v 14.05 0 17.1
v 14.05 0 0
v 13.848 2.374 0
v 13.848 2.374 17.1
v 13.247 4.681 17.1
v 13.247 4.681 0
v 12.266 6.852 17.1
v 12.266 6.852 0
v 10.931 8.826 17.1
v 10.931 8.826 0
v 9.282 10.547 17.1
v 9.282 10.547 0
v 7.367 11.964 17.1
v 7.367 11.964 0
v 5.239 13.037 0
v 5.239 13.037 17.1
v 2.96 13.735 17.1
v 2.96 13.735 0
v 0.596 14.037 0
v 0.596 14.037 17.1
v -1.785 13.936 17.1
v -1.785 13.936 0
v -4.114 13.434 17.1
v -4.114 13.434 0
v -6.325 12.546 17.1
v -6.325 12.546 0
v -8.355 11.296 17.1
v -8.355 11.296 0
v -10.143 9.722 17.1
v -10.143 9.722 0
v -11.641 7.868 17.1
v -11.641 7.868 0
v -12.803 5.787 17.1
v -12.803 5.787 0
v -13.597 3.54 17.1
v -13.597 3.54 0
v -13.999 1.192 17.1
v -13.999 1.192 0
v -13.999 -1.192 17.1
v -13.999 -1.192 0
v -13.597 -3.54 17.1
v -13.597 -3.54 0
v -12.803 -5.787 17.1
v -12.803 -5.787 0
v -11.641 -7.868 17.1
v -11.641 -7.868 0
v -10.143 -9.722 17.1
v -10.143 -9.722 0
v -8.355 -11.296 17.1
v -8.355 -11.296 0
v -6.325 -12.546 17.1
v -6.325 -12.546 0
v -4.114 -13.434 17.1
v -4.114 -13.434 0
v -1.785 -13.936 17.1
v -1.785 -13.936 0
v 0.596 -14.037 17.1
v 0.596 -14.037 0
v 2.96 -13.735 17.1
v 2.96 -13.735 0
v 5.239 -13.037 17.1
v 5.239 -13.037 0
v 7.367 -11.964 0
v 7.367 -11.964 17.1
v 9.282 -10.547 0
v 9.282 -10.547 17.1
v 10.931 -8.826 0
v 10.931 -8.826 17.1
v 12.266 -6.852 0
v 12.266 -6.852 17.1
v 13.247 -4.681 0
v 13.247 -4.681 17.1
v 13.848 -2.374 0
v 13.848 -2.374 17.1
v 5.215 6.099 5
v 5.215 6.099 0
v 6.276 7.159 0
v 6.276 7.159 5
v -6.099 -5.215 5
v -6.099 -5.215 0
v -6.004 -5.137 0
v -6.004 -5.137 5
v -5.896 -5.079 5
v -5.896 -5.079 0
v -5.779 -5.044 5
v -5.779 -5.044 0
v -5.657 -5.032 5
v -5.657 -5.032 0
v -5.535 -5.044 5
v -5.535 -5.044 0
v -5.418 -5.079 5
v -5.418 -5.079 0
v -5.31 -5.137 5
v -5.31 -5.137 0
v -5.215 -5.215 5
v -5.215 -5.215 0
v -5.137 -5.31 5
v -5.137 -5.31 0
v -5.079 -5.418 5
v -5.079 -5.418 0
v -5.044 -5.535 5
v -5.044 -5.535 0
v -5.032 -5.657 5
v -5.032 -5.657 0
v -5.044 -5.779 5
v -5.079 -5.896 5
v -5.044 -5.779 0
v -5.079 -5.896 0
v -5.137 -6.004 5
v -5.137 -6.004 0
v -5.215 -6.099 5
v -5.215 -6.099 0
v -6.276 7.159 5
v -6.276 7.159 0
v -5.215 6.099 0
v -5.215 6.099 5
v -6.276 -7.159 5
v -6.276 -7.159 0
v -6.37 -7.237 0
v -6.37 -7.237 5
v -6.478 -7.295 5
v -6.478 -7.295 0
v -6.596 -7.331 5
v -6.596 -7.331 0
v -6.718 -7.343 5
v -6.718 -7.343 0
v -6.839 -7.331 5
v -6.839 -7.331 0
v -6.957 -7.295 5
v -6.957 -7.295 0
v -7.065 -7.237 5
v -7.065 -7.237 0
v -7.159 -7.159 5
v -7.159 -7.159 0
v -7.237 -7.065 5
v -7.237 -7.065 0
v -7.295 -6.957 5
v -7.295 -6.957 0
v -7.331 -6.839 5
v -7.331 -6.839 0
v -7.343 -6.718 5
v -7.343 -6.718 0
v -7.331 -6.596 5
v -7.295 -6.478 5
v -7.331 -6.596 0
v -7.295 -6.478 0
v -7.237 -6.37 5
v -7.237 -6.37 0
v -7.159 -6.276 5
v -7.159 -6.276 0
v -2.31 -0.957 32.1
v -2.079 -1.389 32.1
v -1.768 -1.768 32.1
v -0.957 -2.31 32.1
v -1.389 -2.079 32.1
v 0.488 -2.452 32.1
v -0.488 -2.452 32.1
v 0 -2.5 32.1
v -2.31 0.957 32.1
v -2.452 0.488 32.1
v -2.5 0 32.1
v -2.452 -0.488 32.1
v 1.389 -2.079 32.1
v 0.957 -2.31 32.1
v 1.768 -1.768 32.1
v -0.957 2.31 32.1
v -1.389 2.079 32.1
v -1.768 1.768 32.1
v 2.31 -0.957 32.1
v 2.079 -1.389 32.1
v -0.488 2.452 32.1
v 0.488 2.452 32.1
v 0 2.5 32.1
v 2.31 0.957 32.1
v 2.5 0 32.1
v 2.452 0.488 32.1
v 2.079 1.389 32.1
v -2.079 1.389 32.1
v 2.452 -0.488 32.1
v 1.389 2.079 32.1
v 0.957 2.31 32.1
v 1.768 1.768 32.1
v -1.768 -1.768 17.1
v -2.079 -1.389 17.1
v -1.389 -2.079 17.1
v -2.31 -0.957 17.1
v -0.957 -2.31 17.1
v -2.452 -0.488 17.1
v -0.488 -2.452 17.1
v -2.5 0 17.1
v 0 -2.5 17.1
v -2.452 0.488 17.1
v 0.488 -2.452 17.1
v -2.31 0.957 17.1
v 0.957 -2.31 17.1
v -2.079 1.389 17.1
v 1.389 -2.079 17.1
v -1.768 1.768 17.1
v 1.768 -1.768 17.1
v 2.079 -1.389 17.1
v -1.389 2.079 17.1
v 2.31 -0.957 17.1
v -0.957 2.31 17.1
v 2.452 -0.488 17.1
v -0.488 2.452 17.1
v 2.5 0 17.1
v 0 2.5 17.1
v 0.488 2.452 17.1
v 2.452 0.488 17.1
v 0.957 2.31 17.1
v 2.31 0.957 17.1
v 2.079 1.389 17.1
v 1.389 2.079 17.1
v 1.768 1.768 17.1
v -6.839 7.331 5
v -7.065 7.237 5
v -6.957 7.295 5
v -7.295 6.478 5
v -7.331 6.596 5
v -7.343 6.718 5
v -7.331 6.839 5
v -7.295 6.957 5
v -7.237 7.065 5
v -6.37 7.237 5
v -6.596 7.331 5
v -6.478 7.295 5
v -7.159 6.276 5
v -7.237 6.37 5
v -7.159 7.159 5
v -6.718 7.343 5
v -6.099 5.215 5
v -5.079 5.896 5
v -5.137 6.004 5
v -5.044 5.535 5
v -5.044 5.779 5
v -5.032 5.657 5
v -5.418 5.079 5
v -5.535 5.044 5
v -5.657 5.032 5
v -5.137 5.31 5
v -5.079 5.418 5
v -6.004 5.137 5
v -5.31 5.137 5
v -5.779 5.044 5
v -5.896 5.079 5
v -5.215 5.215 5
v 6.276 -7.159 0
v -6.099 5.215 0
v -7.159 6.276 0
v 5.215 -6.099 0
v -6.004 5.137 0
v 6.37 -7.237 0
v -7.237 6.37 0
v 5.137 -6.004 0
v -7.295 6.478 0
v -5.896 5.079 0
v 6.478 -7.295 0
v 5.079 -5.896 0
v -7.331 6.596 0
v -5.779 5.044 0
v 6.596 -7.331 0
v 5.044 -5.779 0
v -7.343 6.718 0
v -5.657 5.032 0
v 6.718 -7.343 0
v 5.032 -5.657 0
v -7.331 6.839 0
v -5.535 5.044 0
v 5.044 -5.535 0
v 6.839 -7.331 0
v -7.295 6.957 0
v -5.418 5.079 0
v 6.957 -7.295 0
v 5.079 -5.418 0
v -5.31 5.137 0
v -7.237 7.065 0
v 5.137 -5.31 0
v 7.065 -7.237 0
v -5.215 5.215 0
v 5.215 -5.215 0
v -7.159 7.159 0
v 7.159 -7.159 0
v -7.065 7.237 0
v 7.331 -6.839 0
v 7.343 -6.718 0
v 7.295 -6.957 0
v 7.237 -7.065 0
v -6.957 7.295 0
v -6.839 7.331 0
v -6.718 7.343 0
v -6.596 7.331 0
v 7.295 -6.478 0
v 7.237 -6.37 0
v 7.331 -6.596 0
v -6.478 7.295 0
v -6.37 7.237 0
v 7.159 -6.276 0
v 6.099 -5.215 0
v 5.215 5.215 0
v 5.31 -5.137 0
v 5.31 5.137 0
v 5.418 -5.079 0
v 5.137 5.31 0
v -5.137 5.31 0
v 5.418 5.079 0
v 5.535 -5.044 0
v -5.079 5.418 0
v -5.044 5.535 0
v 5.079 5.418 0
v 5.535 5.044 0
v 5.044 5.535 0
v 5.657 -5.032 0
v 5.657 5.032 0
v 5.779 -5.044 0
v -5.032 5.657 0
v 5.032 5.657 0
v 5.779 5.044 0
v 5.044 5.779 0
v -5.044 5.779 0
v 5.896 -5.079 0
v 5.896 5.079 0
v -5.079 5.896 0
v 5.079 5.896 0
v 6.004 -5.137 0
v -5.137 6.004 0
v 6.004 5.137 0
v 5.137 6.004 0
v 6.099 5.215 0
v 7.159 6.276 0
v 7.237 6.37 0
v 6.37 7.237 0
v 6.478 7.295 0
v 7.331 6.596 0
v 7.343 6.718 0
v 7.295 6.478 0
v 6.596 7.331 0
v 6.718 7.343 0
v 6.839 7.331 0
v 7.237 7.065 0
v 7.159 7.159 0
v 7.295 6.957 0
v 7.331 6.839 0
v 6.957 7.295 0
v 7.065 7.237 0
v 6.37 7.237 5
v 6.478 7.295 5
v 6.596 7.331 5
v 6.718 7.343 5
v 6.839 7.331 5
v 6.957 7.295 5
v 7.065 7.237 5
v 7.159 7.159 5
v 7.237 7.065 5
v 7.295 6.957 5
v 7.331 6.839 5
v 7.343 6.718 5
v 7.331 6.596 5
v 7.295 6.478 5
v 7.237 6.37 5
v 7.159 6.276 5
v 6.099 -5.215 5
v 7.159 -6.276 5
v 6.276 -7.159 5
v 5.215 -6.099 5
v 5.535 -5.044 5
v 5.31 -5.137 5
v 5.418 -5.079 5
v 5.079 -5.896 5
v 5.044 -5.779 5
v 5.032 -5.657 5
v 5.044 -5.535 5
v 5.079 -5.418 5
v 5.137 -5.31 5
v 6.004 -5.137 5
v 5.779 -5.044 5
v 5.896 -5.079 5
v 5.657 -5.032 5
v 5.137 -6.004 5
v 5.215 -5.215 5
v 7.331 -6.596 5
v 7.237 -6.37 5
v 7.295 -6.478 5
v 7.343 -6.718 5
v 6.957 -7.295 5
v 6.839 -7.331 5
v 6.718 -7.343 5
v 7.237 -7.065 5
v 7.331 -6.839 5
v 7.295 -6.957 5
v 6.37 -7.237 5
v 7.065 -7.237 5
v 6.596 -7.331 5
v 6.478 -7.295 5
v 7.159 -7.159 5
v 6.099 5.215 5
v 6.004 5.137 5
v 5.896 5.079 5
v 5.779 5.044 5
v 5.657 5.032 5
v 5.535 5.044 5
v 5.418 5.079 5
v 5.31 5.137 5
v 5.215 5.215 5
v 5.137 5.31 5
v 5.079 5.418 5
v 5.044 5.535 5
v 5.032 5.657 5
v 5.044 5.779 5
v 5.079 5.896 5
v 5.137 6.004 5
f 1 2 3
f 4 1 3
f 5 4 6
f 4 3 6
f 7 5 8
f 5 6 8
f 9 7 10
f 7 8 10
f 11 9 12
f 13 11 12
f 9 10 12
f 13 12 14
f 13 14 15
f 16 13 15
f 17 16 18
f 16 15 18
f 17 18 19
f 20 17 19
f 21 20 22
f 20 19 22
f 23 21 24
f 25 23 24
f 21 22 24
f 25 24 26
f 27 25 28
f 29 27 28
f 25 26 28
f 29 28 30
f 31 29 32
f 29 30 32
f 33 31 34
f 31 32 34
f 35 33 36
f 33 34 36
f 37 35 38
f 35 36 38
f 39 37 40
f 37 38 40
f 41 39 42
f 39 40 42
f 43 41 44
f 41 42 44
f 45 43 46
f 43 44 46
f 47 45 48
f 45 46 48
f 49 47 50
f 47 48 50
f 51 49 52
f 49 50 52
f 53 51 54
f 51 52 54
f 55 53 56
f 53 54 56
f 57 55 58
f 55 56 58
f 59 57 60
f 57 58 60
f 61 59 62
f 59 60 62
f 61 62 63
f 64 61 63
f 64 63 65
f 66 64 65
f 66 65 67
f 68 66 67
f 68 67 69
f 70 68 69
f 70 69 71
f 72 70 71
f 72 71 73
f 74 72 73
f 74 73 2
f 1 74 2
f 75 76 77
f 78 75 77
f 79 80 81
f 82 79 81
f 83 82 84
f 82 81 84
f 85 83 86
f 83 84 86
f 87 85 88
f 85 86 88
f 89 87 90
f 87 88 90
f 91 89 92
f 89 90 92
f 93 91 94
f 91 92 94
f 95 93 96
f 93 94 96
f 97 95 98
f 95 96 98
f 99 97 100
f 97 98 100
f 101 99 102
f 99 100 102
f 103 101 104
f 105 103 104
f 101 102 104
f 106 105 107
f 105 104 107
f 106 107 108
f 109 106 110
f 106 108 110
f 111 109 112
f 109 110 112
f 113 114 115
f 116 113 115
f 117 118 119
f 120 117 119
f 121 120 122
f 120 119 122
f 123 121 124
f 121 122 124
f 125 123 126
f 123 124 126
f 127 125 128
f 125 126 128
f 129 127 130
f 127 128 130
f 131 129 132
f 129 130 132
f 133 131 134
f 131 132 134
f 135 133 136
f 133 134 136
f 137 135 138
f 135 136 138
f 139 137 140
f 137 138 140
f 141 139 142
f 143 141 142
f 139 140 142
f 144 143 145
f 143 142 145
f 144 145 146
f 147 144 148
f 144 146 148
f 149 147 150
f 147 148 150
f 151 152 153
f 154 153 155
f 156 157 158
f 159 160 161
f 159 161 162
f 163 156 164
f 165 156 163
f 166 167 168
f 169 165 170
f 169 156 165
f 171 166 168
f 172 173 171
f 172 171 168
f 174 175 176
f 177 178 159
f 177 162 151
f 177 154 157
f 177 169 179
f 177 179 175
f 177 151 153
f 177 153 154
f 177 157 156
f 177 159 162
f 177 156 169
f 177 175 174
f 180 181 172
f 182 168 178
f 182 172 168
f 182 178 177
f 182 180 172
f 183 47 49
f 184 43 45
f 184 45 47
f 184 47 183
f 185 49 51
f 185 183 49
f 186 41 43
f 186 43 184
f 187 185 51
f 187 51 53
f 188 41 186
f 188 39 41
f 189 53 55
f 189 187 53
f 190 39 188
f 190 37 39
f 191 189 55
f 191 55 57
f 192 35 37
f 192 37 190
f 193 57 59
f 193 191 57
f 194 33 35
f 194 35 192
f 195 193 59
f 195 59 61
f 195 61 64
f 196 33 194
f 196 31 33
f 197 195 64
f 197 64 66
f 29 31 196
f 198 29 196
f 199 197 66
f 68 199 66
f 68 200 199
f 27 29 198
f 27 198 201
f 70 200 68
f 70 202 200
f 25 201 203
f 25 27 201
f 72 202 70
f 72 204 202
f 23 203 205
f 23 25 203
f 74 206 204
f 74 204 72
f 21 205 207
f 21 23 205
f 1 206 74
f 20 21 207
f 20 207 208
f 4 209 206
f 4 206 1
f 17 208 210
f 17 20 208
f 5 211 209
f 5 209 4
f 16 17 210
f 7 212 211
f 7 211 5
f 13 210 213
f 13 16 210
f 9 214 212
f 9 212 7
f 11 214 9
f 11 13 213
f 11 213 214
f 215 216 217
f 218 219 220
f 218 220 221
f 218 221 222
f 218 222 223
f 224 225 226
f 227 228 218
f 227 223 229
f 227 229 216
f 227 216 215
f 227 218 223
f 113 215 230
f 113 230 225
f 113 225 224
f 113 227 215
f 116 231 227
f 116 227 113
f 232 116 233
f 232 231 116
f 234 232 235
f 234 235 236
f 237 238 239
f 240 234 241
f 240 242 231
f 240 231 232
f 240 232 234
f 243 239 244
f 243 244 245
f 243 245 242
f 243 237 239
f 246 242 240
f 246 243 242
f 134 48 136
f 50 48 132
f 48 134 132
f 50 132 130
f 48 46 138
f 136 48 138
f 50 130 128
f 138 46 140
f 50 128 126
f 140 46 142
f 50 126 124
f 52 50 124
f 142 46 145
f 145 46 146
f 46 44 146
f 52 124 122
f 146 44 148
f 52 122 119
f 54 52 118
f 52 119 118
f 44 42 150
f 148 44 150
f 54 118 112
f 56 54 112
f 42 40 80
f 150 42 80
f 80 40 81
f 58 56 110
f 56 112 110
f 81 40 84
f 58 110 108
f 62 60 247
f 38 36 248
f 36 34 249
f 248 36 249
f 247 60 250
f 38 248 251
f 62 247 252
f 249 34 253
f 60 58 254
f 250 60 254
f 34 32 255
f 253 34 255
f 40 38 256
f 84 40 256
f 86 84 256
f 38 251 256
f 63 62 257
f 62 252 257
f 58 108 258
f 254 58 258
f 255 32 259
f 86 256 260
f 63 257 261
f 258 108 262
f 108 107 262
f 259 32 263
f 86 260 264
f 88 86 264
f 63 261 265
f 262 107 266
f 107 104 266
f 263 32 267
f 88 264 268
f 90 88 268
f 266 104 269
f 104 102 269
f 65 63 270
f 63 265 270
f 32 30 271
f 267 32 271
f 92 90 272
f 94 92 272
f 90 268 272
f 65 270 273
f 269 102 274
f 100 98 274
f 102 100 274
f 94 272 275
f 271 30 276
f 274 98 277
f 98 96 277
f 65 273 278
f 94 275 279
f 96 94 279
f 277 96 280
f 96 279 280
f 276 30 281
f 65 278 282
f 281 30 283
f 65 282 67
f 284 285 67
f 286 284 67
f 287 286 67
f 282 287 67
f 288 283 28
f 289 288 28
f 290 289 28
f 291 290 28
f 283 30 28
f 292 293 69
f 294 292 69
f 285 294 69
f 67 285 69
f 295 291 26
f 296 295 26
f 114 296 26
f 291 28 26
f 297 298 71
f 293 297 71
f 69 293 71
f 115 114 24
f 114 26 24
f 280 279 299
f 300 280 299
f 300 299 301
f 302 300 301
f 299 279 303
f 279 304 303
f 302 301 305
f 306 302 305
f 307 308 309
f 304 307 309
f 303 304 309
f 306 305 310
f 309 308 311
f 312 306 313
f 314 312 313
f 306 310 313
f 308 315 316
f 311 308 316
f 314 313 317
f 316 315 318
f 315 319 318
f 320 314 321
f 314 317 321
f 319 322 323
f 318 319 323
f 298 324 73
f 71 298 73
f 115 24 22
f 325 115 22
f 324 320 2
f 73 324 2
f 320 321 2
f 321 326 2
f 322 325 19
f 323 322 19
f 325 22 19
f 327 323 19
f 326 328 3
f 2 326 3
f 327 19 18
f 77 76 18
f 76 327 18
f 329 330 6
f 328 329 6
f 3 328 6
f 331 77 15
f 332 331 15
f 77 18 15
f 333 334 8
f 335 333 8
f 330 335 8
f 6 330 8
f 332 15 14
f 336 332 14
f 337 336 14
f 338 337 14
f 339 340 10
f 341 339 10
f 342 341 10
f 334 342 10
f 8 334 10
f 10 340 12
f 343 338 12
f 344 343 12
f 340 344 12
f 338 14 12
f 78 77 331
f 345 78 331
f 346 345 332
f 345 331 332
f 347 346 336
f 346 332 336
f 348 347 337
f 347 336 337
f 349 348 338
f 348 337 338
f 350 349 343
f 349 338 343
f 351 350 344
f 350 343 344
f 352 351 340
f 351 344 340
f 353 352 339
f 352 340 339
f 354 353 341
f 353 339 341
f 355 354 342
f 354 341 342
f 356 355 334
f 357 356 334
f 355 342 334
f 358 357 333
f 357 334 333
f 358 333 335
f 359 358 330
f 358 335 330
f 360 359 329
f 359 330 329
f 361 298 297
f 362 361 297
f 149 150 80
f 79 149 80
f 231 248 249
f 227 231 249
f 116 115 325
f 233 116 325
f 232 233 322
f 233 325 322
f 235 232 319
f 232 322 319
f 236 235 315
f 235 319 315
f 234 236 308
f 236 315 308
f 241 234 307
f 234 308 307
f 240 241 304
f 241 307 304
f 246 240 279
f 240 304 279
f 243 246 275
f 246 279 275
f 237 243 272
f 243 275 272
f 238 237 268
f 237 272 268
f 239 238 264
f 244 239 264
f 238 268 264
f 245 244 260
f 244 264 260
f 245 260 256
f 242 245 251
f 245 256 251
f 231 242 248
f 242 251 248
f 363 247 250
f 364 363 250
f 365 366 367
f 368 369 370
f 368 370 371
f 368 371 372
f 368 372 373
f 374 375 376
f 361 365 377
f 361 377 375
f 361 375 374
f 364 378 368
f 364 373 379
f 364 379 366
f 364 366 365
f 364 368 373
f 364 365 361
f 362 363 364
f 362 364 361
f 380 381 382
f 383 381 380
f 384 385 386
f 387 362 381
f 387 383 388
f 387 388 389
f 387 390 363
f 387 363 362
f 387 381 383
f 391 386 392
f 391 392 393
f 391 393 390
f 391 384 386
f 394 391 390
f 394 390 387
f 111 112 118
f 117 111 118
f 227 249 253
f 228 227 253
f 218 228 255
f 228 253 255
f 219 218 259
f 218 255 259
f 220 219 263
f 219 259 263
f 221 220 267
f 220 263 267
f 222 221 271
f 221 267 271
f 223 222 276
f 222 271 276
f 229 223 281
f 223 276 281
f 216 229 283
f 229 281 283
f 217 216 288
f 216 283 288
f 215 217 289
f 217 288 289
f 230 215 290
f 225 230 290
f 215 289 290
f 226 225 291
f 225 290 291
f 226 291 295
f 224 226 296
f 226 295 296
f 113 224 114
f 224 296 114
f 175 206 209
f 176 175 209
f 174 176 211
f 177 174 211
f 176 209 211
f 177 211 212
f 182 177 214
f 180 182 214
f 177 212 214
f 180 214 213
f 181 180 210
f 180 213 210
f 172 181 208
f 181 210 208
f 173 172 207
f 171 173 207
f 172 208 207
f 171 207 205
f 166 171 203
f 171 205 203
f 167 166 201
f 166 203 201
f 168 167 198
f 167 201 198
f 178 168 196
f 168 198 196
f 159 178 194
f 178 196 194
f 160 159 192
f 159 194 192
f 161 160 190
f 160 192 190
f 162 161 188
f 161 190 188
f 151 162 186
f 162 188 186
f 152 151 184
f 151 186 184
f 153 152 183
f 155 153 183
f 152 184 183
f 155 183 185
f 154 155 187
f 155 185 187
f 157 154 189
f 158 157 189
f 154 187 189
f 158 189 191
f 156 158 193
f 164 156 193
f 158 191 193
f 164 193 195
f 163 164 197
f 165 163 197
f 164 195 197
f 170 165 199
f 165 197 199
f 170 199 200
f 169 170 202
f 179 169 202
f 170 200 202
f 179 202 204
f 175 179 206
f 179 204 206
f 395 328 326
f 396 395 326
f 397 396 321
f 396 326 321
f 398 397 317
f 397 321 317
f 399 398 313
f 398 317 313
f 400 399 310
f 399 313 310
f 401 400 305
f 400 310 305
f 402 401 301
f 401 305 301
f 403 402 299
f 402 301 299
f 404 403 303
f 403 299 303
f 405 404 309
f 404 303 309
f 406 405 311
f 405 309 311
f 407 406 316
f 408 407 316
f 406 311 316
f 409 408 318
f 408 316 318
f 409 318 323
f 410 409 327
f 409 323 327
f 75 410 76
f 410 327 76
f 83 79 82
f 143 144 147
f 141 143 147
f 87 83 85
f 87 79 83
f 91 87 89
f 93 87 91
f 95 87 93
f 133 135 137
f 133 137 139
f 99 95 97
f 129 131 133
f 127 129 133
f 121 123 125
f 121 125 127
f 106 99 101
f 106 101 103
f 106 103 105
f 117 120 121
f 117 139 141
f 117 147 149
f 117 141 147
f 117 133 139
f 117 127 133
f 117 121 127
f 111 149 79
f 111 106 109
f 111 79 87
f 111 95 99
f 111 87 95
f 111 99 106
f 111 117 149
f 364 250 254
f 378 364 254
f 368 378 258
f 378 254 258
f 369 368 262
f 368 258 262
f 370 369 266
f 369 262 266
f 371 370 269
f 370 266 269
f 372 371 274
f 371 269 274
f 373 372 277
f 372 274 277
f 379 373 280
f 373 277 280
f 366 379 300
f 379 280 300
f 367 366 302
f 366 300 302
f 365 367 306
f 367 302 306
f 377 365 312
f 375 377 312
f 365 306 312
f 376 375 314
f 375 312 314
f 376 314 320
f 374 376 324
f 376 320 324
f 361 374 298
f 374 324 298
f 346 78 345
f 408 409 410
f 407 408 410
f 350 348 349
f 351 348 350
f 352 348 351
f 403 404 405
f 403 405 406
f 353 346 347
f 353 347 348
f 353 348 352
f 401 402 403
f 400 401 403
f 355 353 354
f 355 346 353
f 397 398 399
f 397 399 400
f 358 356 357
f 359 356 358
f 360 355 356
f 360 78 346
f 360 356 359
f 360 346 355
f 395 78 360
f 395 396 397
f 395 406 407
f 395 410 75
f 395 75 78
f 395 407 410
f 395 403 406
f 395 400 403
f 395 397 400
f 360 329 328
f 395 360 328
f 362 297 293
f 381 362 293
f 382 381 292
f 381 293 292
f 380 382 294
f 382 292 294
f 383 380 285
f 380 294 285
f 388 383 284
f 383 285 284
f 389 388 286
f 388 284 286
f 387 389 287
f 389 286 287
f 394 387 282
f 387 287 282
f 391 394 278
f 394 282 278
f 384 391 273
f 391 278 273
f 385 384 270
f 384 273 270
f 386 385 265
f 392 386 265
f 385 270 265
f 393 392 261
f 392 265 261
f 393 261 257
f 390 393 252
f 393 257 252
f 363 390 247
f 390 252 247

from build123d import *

# Parameters (mm, degrees)
F0_R     = 14.05
F1_DEPTH = 17.1
F2_R     = 2.5
F3_DEPTH = 15
F5_DEPTH = 5


with BuildPart() as f1:
    # F0 (on Top) → F1 (new body)
    with BuildSketch(Plane.XY):
        Circle(F0_R)
    extrude(amount=F1_DEPTH)

    # F2 (on face) → F3 (join)
    with BuildSketch(Plane.XY.offset(17.1)):
        Circle(F2_R)
    extrude(amount=F3_DEPTH)

    # F4 (on face) → F5 (cut)
    with BuildSketch(Plane(origin=(0, 0, 0), x_dir=(1, 0, 0), z_dir=(0, 0, -1))):
        with BuildLine():
            ThreePointArc((-6.275573, 7.159456), (-7.159456, 7.159456), (-7.159456, 6.275573))
            Line((-7.159456, 6.275573), (-6.098796, 5.214913))
            ThreePointArc((-6.098796, 5.214913), (-5.214913, 5.214913), (-5.214913, 6.098796))
            Line((-5.214913, 6.098796), (-6.275573, 7.159456))
        make_face()
        with BuildLine():
            ThreePointArc((7.159456, 6.275573), (7.159456, 7.159456), (6.275573, 7.159456))
            Line((6.275573, 7.159456), (5.214913, 6.098796))
            ThreePointArc((5.214913, 6.098796), (5.214913, 5.214913), (6.098796, 5.214913))
            Line((6.098796, 5.214913), (7.159456, 6.275573))
        make_face()
        with BuildLine():
            ThreePointArc((6.275573, -7.159456), (7.159456, -7.159456), (7.159456, -6.275573))
            Line((7.159456, -6.275573), (6.098796, -5.214913))
            ThreePointArc((6.098796, -5.214913), (5.214913, -5.214913), (5.214913, -6.098796))
            Line((5.214913, -6.098796), (6.275573, -7.159456))
        make_face()
        with BuildLine():
            ThreePointArc((-7.159456, -6.275573), (-7.159456, -7.159456), (-6.275573, -7.159456))
            Line((-6.275573, -7.159456), (-5.214913, -6.098796))
            ThreePointArc((-5.214913, -6.098796), (-5.214913, -5.214913), (-6.098796, -5.214913))
            Line((-6.098796, -5.214913), (-7.159456, -6.275573))
        make_face()
    extrude(amount=-F5_DEPTH, mode=Mode.SUBTRACT)


solid = f1.part
